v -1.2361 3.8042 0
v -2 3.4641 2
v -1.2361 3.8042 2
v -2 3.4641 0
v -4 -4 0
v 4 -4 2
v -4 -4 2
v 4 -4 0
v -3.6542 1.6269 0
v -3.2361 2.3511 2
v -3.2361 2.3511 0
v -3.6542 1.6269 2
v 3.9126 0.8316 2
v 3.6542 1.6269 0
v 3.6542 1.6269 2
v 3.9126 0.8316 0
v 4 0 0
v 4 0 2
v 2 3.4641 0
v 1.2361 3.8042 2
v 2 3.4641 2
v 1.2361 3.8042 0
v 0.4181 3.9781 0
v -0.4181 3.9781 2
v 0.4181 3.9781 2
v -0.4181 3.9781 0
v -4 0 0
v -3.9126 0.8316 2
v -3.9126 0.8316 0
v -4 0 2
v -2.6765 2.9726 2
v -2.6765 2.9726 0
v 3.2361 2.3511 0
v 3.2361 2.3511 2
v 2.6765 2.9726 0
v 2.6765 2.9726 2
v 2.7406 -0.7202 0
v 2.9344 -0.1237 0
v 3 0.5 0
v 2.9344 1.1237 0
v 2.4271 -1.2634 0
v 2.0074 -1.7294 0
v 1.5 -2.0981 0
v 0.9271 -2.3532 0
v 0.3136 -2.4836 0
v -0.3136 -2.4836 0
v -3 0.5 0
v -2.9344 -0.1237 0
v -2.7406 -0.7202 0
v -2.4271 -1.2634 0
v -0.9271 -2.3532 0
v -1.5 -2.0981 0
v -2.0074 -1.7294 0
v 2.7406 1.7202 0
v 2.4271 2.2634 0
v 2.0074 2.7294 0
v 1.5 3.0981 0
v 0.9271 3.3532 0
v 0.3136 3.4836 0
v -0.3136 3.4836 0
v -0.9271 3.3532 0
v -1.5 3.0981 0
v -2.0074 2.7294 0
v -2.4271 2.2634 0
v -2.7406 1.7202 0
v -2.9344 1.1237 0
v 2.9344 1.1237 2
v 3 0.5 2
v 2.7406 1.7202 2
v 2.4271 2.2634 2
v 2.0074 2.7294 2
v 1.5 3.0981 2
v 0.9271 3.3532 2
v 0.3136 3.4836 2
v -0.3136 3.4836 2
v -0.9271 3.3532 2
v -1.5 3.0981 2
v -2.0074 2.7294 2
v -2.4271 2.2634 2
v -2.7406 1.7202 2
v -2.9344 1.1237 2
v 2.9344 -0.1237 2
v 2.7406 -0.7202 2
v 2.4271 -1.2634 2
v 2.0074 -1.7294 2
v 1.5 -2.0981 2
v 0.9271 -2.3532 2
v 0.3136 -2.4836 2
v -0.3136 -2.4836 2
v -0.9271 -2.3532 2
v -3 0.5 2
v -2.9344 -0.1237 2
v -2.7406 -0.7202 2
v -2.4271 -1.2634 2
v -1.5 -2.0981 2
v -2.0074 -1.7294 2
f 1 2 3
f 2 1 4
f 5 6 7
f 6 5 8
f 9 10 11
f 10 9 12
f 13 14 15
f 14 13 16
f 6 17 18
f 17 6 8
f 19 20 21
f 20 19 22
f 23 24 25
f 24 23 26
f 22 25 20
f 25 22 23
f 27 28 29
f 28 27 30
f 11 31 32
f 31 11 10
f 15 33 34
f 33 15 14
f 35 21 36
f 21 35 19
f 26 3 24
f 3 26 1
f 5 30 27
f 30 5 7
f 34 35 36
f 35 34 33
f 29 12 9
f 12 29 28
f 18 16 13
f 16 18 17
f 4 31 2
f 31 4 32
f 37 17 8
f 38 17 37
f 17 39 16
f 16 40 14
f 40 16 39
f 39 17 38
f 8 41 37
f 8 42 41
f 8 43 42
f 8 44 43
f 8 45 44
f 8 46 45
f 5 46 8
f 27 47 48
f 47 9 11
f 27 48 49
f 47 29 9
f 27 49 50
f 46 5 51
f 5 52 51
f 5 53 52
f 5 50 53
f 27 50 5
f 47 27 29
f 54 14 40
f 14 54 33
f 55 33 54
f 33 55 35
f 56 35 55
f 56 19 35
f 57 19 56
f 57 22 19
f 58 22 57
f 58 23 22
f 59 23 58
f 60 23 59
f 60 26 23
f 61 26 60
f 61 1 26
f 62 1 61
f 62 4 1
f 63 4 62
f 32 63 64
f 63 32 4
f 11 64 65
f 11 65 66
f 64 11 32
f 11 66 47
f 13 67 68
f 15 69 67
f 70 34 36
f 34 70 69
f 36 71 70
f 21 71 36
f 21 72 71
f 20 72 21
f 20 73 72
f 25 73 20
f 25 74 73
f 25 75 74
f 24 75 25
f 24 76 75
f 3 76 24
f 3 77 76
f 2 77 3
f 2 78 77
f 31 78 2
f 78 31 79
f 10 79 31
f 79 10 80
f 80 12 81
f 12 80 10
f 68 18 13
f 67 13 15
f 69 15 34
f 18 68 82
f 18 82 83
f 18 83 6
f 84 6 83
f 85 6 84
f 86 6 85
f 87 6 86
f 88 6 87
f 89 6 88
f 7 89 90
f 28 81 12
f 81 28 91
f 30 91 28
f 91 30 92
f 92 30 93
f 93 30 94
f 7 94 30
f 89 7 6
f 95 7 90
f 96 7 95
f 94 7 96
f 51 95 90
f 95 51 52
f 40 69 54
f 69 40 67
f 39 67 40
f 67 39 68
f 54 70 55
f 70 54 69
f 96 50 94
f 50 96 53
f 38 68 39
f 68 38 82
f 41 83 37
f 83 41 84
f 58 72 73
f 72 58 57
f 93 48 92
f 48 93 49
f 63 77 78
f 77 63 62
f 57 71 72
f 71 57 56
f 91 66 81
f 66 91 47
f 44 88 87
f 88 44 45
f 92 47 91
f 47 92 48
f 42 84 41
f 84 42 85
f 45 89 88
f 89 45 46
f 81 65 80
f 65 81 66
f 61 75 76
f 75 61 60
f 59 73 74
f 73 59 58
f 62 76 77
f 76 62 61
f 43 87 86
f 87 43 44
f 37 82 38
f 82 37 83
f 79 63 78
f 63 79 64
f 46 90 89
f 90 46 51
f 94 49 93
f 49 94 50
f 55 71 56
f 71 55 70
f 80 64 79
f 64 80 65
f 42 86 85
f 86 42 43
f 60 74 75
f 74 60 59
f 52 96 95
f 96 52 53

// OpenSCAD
ROD_DIA = 6;
HEIGHT = 2;
THICKNESS = 1;

$fn = 30;

difference() {
    d = ROD_DIA + 2 * THICKNESS;
    hull() {
        cylinder(d = d, h = HEIGHT);
 
        translate([-d/2, -d/2, 0])
        cube(size = [d, 2 * THICKNESS, HEIGHT]);            
    }
    translate([0, THICKNESS/2, 0])
    cylinder(d = ROD_DIA, h = HEIGHT);
}
